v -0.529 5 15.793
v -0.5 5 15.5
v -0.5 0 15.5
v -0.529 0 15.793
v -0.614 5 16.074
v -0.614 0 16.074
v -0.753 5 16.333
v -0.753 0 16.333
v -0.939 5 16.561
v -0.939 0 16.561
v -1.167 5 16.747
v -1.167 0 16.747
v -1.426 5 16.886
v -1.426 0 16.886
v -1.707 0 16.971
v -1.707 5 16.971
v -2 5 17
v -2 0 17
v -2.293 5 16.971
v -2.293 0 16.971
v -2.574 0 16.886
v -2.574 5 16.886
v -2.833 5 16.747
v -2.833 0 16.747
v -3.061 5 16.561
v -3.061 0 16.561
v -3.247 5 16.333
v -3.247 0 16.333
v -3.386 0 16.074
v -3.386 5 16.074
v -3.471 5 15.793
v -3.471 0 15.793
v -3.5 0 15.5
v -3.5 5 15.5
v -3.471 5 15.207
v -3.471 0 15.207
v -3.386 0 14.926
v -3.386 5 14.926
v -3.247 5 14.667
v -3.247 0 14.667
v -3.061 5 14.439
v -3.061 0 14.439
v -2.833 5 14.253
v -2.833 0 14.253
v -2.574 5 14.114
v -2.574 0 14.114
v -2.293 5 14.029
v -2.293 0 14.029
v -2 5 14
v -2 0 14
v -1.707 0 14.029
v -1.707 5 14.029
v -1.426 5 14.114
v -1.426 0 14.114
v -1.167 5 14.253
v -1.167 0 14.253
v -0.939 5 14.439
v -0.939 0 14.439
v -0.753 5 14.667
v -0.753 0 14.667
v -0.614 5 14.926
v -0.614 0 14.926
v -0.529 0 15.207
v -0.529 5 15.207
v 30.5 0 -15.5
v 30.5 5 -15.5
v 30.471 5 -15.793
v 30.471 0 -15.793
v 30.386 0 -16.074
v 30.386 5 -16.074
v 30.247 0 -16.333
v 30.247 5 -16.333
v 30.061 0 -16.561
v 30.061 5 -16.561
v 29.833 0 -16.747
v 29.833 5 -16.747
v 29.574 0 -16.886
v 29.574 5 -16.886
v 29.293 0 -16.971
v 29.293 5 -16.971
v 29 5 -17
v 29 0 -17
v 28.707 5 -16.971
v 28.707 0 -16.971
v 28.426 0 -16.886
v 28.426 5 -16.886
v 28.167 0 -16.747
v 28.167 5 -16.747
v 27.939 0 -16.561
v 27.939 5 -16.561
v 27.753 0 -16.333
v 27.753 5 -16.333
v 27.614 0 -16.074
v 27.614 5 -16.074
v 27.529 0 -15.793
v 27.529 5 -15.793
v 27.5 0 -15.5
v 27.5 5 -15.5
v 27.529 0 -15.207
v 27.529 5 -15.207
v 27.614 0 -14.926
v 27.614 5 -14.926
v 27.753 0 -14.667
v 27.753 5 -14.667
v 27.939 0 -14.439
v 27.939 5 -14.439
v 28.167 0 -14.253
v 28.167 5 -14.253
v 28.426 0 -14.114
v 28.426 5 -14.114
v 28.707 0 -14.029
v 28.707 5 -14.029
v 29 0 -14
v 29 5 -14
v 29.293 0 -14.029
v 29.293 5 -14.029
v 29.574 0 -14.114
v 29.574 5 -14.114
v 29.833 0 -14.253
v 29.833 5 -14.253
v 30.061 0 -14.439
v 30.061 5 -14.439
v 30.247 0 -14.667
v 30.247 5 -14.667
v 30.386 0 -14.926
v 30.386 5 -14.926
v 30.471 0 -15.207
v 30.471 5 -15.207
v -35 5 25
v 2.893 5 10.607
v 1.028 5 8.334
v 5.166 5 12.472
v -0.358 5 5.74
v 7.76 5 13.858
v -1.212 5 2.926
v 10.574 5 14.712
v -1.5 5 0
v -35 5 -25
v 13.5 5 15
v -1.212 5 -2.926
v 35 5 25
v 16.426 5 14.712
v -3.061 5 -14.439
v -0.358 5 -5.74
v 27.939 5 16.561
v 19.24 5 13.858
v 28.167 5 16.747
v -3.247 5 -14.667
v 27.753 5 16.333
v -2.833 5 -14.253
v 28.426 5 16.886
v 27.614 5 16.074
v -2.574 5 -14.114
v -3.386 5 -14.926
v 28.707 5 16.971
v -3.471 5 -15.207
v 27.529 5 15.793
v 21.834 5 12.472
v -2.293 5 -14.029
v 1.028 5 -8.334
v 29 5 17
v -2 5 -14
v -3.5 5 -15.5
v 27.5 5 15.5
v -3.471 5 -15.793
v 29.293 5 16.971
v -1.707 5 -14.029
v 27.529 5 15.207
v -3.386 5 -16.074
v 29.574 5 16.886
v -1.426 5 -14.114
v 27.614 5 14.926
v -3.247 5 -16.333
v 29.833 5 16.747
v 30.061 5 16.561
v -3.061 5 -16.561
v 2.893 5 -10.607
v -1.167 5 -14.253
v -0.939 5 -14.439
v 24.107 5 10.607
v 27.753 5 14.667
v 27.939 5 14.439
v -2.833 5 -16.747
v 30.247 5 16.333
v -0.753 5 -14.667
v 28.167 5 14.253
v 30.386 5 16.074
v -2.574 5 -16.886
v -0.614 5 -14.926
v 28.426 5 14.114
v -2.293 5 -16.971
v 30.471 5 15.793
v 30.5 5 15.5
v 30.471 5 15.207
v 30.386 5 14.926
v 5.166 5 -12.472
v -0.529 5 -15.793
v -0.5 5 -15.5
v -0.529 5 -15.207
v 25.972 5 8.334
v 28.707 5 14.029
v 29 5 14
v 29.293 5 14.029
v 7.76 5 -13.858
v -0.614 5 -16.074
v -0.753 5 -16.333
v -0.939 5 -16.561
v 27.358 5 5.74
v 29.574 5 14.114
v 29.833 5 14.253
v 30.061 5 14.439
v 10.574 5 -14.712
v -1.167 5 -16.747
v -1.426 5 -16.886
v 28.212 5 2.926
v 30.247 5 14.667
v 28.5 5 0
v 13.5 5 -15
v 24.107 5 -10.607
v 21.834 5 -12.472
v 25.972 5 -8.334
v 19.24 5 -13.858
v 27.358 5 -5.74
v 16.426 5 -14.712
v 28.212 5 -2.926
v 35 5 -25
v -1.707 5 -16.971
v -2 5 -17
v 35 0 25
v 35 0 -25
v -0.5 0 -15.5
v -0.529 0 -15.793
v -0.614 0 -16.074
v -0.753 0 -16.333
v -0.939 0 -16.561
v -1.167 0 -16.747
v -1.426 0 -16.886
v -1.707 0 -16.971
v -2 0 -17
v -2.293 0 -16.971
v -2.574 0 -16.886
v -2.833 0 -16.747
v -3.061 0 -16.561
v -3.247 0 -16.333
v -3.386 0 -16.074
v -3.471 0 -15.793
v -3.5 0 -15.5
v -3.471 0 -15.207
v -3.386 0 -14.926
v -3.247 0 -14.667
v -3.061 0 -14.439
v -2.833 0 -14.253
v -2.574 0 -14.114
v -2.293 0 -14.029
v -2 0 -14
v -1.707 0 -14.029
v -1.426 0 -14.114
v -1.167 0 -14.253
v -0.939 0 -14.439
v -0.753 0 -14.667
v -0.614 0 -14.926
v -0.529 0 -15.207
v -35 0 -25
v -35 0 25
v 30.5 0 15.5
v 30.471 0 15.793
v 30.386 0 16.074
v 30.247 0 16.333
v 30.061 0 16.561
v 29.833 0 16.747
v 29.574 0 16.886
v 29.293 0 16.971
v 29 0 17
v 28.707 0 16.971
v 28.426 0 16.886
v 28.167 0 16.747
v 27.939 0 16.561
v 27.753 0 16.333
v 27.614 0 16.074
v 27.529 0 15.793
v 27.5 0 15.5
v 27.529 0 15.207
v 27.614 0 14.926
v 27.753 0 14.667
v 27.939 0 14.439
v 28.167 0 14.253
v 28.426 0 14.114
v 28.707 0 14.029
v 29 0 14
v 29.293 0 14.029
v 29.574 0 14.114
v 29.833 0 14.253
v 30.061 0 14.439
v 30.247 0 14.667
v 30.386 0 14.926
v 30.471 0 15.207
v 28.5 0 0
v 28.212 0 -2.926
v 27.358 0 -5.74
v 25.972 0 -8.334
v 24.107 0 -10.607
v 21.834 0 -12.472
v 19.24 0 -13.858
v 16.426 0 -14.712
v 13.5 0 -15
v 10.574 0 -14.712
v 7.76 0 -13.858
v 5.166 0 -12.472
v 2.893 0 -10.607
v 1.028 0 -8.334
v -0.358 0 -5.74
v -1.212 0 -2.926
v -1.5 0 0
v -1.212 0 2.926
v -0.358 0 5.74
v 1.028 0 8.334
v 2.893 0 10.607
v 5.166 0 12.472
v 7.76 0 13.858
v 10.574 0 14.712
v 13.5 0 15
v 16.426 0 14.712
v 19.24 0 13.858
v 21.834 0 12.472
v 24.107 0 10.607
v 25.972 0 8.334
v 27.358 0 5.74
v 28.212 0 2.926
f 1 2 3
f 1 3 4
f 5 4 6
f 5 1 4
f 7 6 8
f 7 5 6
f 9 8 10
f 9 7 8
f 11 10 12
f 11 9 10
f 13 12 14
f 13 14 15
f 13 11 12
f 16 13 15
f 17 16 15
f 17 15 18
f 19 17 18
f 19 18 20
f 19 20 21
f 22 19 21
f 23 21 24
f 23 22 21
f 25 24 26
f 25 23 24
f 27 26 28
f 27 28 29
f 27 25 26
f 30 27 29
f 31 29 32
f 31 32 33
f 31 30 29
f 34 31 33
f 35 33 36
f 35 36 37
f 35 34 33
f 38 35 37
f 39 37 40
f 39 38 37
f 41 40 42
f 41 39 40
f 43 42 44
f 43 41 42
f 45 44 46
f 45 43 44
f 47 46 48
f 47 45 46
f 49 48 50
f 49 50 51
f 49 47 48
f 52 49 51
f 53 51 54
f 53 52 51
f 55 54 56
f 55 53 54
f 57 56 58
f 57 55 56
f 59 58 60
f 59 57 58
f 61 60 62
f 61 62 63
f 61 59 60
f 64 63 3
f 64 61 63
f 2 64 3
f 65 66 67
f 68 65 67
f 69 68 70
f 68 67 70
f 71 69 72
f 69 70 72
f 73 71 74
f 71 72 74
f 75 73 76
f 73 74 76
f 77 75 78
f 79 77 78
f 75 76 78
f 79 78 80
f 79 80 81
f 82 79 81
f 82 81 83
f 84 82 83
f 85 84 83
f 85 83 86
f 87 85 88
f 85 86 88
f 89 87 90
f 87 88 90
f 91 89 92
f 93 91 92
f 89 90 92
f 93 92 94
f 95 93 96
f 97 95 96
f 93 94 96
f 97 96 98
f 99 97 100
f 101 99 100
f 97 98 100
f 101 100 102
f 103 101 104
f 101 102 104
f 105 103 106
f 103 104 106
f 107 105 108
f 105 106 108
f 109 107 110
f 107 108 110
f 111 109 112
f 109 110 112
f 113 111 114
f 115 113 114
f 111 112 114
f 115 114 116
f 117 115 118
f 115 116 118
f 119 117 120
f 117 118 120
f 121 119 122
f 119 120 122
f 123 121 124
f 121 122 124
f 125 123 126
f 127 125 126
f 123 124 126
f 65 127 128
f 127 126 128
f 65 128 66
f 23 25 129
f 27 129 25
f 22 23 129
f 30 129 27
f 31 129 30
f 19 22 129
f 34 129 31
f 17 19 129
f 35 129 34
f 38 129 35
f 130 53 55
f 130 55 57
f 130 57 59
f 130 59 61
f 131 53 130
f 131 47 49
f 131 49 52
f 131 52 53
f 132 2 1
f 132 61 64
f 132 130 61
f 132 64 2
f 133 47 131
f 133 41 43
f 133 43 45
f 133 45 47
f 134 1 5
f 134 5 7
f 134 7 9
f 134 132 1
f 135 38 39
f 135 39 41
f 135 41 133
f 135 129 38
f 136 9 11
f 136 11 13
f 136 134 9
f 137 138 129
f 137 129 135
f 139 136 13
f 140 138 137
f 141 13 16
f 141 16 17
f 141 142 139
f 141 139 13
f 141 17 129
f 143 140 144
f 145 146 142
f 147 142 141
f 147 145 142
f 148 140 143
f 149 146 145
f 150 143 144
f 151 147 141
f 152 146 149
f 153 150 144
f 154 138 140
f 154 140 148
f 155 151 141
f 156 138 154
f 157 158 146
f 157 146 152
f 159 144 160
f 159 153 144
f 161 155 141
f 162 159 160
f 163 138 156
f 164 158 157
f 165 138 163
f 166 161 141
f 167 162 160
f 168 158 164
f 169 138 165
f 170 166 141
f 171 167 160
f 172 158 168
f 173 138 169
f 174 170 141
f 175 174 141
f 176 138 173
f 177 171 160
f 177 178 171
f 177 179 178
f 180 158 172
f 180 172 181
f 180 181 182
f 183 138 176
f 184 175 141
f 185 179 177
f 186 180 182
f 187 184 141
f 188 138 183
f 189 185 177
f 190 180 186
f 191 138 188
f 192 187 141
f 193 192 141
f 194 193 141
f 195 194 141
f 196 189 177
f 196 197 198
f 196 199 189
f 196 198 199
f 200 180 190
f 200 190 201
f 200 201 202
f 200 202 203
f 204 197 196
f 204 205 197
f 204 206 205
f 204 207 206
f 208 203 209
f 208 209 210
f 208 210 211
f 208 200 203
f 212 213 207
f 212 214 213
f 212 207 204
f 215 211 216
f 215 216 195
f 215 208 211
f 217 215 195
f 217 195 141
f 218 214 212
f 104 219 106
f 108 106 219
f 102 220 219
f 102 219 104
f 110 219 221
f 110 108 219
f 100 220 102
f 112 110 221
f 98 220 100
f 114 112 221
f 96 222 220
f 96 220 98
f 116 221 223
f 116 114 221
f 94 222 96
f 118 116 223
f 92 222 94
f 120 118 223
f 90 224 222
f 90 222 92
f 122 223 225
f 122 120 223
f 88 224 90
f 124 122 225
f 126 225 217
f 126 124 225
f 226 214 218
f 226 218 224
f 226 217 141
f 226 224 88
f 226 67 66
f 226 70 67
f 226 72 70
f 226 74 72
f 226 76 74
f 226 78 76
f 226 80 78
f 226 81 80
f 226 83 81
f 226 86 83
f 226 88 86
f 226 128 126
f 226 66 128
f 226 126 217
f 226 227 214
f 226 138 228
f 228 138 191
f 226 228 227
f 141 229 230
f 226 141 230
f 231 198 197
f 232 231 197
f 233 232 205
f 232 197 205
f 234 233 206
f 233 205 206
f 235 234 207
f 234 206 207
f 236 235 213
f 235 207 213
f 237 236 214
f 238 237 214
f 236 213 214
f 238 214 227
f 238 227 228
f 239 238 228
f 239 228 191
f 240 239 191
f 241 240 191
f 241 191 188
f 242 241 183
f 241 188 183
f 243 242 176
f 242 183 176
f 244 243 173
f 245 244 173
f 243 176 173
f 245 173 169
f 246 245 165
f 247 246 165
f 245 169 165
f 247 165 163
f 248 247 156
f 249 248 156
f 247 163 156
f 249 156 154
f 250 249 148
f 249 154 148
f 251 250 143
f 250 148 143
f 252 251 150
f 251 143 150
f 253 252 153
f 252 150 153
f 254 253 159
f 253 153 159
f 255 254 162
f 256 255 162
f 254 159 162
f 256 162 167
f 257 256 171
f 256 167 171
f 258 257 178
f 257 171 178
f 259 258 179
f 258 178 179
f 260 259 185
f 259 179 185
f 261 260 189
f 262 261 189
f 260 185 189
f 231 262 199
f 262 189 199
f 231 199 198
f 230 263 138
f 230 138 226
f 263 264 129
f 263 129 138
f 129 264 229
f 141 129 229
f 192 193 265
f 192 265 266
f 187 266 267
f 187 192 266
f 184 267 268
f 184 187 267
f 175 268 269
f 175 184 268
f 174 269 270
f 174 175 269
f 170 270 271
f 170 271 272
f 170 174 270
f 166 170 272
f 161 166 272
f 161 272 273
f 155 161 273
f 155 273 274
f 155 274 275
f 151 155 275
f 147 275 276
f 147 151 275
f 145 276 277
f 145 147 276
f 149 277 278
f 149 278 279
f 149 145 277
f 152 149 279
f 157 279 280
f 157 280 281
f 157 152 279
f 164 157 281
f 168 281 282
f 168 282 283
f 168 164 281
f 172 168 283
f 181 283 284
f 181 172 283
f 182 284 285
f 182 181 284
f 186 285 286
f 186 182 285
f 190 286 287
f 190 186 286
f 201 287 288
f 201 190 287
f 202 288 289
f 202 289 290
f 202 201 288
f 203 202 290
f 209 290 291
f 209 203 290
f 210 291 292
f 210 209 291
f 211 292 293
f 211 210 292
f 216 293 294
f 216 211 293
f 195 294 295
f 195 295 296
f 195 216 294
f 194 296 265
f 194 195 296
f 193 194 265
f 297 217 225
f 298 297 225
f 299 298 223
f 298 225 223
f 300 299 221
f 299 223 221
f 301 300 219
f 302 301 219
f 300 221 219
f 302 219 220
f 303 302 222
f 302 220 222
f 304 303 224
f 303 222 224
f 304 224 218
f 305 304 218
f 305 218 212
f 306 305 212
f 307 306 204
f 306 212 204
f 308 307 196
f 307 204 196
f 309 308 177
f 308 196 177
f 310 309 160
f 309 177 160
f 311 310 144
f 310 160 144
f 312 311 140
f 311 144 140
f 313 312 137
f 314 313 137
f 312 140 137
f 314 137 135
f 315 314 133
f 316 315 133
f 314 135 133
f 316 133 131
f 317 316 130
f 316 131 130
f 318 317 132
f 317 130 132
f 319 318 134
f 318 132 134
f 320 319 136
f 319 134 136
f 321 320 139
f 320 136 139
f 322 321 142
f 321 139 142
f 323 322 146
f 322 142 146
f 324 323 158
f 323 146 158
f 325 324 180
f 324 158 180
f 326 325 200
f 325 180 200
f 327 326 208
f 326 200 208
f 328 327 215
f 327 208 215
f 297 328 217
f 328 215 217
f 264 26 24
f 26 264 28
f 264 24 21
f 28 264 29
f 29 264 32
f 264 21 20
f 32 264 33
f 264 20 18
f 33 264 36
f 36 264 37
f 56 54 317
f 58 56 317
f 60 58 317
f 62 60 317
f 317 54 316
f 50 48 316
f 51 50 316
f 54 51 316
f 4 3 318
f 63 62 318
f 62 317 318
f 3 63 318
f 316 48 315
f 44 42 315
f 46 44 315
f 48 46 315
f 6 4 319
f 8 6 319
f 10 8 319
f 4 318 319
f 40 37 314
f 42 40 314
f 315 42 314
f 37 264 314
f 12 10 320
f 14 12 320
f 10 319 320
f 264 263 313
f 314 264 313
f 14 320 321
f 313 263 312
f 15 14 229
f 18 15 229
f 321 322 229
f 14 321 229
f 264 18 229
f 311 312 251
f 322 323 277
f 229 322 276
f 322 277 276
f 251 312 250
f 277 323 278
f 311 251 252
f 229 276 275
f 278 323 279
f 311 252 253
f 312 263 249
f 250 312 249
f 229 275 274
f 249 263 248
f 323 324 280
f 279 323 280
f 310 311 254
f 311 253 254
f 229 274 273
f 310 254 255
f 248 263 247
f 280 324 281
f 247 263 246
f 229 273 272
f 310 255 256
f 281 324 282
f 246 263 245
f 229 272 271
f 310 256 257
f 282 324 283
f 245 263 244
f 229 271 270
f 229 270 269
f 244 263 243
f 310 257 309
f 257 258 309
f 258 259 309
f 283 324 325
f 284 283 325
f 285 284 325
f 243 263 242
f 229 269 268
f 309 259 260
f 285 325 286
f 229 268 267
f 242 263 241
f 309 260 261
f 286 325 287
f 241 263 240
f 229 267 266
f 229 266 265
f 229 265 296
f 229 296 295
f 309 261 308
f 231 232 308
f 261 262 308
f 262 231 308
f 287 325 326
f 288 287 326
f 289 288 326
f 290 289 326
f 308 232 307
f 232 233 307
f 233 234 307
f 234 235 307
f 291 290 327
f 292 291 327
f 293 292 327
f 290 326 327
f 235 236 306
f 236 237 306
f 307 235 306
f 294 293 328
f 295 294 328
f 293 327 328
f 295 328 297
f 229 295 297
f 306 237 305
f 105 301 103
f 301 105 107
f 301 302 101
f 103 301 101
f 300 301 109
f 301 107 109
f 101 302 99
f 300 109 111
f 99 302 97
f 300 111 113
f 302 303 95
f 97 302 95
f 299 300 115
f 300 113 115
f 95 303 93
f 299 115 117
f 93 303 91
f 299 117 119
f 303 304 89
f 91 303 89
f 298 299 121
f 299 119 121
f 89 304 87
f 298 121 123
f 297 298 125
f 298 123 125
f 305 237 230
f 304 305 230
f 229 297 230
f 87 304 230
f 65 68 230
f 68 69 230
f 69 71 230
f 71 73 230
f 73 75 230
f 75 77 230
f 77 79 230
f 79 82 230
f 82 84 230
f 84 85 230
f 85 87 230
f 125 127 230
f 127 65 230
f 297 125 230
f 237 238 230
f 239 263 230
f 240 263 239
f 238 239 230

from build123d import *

# Parameters (mm, degrees)
SKETCH1_W           = 70
SKETCH1_H           = 50
BOSS_EXTRUDE1_DEPTH = 5
SKETCH2_R           = 1.5
CUT_EXTRUDE1_DEPTH  = 5
SKETCH3_R           = 15
CUT_EXTRUDE2_DEPTH  = 5


with BuildPart() as part:
    # Sketch1 → Boss-Extrude1 (new body)
    with BuildSketch(Plane(origin=(0, 0, 0), x_dir=(1, 0, 0), z_dir=(0, 1, 0))):
        Rectangle(SKETCH1_W, SKETCH1_H)
    extrude(amount=BOSS_EXTRUDE1_DEPTH)

    # Sketch2 → Cut-Extrude1 (cut)
    with BuildSketch(Plane(origin=(0, 5, 0), x_dir=(1, 0, 0), z_dir=(0, 1, 0))):
        with Locations((29, 15.5)):
            Circle(SKETCH2_R)
        with Locations((-2, 15.5)):
            Circle(SKETCH2_R)
    cut_extrude1 = extrude(amount=-CUT_EXTRUDE1_DEPTH, mode=Mode.SUBTRACT)

    # Mirror1: Cut-Extrude1 across plane
    add(cut_extrude1.mirror(Plane.XY), mode=Mode.SUBTRACT)

    # Sketch3 → Cut-Extrude2 (cut)
    with BuildSketch(Plane(origin=(0, 5, 0), x_dir=(1, 0, 0), z_dir=(0, 1, 0))):
        with Locations((13.5, 0)):
            Circle(SKETCH3_R)
    extrude(amount=-CUT_EXTRUDE2_DEPTH, mode=Mode.SUBTRACT)


solid = part.part
